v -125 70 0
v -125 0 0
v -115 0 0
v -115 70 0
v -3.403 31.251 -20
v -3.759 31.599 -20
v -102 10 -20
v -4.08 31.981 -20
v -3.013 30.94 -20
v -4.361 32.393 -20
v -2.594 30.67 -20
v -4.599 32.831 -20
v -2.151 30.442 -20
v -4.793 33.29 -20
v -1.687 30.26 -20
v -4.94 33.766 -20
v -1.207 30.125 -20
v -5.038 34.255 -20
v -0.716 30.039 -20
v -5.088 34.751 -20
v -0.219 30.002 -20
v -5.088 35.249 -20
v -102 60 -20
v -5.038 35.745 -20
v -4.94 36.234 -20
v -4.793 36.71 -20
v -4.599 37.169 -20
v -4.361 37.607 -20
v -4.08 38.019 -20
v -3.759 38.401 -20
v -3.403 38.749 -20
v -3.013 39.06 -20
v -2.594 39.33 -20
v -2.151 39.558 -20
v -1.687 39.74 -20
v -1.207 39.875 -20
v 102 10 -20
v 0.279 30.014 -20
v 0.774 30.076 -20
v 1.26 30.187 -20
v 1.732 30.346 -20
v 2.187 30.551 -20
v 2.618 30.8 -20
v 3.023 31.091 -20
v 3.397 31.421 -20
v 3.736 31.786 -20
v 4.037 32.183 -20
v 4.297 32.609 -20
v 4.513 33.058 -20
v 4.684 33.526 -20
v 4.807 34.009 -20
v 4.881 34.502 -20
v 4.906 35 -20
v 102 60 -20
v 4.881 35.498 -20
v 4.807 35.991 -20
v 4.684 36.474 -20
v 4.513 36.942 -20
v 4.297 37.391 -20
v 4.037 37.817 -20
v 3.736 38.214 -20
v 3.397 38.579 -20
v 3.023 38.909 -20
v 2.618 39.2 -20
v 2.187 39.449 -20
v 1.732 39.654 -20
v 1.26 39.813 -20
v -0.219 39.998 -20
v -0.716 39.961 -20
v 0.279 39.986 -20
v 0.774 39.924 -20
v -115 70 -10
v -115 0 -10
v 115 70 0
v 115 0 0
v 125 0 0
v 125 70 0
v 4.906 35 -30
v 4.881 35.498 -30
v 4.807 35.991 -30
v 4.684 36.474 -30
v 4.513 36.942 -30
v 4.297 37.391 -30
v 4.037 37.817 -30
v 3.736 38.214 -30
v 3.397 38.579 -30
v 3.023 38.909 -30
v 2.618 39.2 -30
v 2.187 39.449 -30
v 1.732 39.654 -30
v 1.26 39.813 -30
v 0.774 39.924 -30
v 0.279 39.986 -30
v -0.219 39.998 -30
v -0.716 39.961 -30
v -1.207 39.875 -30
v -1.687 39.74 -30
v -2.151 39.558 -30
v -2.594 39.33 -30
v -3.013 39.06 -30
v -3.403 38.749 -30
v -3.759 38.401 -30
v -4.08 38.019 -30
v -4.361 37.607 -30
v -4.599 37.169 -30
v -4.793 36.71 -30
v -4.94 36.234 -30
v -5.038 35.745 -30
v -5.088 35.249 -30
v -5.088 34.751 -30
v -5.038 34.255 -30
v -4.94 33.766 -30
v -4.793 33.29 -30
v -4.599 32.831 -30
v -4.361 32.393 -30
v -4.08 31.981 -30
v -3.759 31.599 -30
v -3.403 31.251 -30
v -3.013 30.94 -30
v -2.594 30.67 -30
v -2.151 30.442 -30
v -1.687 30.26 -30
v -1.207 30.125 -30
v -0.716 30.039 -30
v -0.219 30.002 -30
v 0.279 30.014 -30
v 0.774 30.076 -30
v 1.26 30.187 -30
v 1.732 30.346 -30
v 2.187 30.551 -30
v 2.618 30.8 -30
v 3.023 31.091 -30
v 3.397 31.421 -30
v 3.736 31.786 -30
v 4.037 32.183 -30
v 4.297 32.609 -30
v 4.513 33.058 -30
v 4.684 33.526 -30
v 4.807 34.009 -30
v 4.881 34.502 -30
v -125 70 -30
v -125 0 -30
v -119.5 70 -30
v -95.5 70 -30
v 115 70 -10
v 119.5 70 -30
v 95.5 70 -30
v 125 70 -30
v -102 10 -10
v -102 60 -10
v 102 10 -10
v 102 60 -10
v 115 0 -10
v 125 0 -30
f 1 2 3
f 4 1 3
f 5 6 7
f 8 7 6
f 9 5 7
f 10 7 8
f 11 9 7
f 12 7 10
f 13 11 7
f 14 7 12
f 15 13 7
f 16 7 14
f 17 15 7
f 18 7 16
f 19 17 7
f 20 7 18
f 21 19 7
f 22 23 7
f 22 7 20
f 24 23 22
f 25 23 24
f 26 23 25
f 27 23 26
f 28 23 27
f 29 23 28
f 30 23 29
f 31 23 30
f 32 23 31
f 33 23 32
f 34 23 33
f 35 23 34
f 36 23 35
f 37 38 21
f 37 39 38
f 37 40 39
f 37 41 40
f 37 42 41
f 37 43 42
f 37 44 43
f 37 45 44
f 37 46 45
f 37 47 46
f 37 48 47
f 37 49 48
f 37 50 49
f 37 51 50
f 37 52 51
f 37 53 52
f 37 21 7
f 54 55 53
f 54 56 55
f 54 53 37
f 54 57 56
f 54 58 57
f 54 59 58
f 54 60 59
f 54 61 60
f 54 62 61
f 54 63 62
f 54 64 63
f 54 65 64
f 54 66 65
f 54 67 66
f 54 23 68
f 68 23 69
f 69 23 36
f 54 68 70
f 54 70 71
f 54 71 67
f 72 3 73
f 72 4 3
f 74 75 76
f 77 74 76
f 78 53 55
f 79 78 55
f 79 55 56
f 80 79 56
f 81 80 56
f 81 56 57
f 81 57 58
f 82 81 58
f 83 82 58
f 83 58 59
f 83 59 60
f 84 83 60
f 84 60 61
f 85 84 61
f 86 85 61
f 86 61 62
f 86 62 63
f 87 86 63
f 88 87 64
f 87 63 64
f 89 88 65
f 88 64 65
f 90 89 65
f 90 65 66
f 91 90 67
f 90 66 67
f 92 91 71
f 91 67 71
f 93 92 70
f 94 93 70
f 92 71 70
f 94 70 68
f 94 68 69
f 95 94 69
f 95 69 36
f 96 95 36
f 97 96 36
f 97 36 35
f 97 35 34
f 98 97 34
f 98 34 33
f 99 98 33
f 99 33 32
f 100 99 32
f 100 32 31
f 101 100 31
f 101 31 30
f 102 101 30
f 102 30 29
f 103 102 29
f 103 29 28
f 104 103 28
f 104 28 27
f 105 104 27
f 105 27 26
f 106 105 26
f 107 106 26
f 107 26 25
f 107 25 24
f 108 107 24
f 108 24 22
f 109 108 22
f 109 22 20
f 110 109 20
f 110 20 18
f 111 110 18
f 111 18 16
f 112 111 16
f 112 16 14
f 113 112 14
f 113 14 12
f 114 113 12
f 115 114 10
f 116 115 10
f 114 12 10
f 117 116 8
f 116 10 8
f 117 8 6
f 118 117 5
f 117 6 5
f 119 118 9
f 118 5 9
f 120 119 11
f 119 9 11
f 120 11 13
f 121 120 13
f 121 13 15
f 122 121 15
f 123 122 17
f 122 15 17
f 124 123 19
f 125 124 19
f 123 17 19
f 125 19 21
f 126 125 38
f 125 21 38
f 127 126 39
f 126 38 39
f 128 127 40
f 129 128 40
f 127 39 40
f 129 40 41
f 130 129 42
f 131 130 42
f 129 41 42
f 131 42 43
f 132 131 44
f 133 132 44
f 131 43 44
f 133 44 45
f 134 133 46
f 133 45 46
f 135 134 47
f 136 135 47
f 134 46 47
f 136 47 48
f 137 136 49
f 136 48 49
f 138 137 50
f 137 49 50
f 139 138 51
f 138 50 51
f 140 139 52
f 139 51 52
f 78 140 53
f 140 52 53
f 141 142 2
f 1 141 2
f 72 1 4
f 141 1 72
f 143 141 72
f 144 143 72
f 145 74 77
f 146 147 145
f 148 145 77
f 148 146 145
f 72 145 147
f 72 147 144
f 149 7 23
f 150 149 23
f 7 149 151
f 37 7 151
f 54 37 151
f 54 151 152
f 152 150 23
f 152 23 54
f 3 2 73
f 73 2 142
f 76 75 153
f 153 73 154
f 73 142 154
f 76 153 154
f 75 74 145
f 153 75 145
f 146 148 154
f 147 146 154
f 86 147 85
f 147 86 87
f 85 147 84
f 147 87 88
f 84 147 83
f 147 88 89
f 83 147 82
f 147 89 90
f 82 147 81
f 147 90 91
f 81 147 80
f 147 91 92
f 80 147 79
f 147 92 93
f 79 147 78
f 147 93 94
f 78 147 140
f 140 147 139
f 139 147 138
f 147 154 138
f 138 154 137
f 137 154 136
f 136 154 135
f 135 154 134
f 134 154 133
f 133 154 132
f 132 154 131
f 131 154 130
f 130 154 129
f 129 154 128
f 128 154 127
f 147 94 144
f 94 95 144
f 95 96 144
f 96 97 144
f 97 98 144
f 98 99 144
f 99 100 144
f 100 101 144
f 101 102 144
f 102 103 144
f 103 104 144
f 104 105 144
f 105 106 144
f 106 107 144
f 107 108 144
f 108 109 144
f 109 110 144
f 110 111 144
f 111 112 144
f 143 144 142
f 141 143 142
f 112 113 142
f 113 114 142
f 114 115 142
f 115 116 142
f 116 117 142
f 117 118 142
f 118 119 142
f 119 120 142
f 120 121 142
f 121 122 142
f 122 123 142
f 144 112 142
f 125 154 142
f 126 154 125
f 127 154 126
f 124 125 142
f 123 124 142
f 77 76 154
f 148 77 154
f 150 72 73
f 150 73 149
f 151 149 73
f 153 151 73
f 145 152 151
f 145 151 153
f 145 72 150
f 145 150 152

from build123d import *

# Parameters (mm, degrees)
SKETCH1_R           = 5
BOSS_EXTRUDE1_DEPTH = 70
SKETCH3_W           = 50
SKETCH3_H           = 30
CUT_EXTRUDE1_DEPTH  = 266.171642526
SKETCH6_W           = 230
SKETCH6_H           = 50
CUT_EXTRUDE2_DEPTH  = 20
SKETCH7_R           = 5
CUT_EXTRUDE3_DEPTH  = 148.244694302
SKETCH8_W           = 34.830665203
SKETCH8_H           = 70
CUT_EXTRUDE4_DEPTH  = 266.171642526
SKETCH9_W           = 230
SKETCH9_H           = 10
CUT_EXTRUDE5_DEPTH  = 147.372811683
SKETCH10_W          = 13
SKETCH10_H          = 50
BOSS_EXTRUDE4_DEPTH = 10


with BuildPart() as part:
    # Sketch1 → Boss-Extrude1 (new body)
    with BuildSketch(Plane(origin=(0, 0, 0), x_dir=(1, 0, 0), z_dir=(0, 1, 0))):
        with BuildLine():
            Line((-125, 0), (125, 0))
            Line((125, 0), (125, 30))
            Line((125, 30), (119.5, 30))
            Line((119.5, 30), (119.5, 42))
            ThreePointArc((119.5, 42), (107.5, 54), (95.5, 42))
            Line((95.5, 42), (95.5, 30))
            Line((95.5, 30), (-95.5, 30))
            Line((-95.5, 30), (-95.5, 42))
            ThreePointArc((-95.5, 42), (-107.5, 54), (-119.5, 42))
            Line((-119.5, 42), (-119.5, 30))
            Line((-119.5, 30), (-125, 30))
            Line((-125, 30), (-125, 0))
        make_face()
        with Locations(Location((107.5, 42, 0), (0, 0, 270))):
            Circle(SKETCH1_R, mode=Mode.SUBTRACT)
        with Locations(Location((-107.5, 42, 0), (0, 0, 270))):
            Circle(SKETCH1_R, mode=Mode.SUBTRACT)
    extrude(amount=BOSS_EXTRUDE1_DEPTH)

    # Sketch3 → Cut-Extrude1 (cut, through all)
    with BuildSketch(Plane.ZY.offset(125)):
        with Locations((-55, 15)):
            Rectangle(SKETCH3_W, SKETCH3_H)
    extrude(amount=-CUT_EXTRUDE1_DEPTH, mode=Mode.SUBTRACT)

    # Sketch6 → Cut-Extrude2 (cut)
    with BuildSketch(Plane.XY):
        with Locations((0, 35)):
            Rectangle(SKETCH6_W, SKETCH6_H)
    extrude(amount=-CUT_EXTRUDE2_DEPTH, mode=Mode.SUBTRACT)

    # Sketch7 → Cut-Extrude3 (cut, through all)
    with BuildSketch(Plane.XY.offset(-20)):
        with Locations((-0.094237072, 35)):
            Circle(SKETCH7_R)
    extrude(amount=-CUT_EXTRUDE3_DEPTH, mode=Mode.SUBTRACT)

    # Sketch8 → Cut-Extrude4 (cut, through all)
    with BuildSketch(Plane(origin=(125, 0, 0), x_dir=(0, 0, -1), z_dir=(1, 0, 0))):
        with Locations((47.415332602, 35)):
            Rectangle(SKETCH8_W, SKETCH8_H)
    extrude(amount=-CUT_EXTRUDE4_DEPTH, mode=Mode.SUBTRACT)

    # Sketch9 → Cut-Extrude5 (cut, through all)
    with BuildSketch(Plane(origin=(0, 70, 0), x_dir=(1, 0, 0), z_dir=(0, 1, 0))):
        with Locations((0, 5)):
            Rectangle(SKETCH9_W, SKETCH9_H)
    extrude(amount=-CUT_EXTRUDE5_DEPTH, mode=Mode.SUBTRACT)

    # Sketch10 → Boss-Extrude4 (add)
    with BuildSketch(Plane.XY.offset(-20)):
        with Locations((-108.5, 35)):
            Rectangle(SKETCH10_W, SKETCH10_H)
        with Locations((108.5, 35)):
            Rectangle(SKETCH10_W, SKETCH10_H)
    extrude(amount=BOSS_EXTRUDE4_DEPTH)


solid = part.part
